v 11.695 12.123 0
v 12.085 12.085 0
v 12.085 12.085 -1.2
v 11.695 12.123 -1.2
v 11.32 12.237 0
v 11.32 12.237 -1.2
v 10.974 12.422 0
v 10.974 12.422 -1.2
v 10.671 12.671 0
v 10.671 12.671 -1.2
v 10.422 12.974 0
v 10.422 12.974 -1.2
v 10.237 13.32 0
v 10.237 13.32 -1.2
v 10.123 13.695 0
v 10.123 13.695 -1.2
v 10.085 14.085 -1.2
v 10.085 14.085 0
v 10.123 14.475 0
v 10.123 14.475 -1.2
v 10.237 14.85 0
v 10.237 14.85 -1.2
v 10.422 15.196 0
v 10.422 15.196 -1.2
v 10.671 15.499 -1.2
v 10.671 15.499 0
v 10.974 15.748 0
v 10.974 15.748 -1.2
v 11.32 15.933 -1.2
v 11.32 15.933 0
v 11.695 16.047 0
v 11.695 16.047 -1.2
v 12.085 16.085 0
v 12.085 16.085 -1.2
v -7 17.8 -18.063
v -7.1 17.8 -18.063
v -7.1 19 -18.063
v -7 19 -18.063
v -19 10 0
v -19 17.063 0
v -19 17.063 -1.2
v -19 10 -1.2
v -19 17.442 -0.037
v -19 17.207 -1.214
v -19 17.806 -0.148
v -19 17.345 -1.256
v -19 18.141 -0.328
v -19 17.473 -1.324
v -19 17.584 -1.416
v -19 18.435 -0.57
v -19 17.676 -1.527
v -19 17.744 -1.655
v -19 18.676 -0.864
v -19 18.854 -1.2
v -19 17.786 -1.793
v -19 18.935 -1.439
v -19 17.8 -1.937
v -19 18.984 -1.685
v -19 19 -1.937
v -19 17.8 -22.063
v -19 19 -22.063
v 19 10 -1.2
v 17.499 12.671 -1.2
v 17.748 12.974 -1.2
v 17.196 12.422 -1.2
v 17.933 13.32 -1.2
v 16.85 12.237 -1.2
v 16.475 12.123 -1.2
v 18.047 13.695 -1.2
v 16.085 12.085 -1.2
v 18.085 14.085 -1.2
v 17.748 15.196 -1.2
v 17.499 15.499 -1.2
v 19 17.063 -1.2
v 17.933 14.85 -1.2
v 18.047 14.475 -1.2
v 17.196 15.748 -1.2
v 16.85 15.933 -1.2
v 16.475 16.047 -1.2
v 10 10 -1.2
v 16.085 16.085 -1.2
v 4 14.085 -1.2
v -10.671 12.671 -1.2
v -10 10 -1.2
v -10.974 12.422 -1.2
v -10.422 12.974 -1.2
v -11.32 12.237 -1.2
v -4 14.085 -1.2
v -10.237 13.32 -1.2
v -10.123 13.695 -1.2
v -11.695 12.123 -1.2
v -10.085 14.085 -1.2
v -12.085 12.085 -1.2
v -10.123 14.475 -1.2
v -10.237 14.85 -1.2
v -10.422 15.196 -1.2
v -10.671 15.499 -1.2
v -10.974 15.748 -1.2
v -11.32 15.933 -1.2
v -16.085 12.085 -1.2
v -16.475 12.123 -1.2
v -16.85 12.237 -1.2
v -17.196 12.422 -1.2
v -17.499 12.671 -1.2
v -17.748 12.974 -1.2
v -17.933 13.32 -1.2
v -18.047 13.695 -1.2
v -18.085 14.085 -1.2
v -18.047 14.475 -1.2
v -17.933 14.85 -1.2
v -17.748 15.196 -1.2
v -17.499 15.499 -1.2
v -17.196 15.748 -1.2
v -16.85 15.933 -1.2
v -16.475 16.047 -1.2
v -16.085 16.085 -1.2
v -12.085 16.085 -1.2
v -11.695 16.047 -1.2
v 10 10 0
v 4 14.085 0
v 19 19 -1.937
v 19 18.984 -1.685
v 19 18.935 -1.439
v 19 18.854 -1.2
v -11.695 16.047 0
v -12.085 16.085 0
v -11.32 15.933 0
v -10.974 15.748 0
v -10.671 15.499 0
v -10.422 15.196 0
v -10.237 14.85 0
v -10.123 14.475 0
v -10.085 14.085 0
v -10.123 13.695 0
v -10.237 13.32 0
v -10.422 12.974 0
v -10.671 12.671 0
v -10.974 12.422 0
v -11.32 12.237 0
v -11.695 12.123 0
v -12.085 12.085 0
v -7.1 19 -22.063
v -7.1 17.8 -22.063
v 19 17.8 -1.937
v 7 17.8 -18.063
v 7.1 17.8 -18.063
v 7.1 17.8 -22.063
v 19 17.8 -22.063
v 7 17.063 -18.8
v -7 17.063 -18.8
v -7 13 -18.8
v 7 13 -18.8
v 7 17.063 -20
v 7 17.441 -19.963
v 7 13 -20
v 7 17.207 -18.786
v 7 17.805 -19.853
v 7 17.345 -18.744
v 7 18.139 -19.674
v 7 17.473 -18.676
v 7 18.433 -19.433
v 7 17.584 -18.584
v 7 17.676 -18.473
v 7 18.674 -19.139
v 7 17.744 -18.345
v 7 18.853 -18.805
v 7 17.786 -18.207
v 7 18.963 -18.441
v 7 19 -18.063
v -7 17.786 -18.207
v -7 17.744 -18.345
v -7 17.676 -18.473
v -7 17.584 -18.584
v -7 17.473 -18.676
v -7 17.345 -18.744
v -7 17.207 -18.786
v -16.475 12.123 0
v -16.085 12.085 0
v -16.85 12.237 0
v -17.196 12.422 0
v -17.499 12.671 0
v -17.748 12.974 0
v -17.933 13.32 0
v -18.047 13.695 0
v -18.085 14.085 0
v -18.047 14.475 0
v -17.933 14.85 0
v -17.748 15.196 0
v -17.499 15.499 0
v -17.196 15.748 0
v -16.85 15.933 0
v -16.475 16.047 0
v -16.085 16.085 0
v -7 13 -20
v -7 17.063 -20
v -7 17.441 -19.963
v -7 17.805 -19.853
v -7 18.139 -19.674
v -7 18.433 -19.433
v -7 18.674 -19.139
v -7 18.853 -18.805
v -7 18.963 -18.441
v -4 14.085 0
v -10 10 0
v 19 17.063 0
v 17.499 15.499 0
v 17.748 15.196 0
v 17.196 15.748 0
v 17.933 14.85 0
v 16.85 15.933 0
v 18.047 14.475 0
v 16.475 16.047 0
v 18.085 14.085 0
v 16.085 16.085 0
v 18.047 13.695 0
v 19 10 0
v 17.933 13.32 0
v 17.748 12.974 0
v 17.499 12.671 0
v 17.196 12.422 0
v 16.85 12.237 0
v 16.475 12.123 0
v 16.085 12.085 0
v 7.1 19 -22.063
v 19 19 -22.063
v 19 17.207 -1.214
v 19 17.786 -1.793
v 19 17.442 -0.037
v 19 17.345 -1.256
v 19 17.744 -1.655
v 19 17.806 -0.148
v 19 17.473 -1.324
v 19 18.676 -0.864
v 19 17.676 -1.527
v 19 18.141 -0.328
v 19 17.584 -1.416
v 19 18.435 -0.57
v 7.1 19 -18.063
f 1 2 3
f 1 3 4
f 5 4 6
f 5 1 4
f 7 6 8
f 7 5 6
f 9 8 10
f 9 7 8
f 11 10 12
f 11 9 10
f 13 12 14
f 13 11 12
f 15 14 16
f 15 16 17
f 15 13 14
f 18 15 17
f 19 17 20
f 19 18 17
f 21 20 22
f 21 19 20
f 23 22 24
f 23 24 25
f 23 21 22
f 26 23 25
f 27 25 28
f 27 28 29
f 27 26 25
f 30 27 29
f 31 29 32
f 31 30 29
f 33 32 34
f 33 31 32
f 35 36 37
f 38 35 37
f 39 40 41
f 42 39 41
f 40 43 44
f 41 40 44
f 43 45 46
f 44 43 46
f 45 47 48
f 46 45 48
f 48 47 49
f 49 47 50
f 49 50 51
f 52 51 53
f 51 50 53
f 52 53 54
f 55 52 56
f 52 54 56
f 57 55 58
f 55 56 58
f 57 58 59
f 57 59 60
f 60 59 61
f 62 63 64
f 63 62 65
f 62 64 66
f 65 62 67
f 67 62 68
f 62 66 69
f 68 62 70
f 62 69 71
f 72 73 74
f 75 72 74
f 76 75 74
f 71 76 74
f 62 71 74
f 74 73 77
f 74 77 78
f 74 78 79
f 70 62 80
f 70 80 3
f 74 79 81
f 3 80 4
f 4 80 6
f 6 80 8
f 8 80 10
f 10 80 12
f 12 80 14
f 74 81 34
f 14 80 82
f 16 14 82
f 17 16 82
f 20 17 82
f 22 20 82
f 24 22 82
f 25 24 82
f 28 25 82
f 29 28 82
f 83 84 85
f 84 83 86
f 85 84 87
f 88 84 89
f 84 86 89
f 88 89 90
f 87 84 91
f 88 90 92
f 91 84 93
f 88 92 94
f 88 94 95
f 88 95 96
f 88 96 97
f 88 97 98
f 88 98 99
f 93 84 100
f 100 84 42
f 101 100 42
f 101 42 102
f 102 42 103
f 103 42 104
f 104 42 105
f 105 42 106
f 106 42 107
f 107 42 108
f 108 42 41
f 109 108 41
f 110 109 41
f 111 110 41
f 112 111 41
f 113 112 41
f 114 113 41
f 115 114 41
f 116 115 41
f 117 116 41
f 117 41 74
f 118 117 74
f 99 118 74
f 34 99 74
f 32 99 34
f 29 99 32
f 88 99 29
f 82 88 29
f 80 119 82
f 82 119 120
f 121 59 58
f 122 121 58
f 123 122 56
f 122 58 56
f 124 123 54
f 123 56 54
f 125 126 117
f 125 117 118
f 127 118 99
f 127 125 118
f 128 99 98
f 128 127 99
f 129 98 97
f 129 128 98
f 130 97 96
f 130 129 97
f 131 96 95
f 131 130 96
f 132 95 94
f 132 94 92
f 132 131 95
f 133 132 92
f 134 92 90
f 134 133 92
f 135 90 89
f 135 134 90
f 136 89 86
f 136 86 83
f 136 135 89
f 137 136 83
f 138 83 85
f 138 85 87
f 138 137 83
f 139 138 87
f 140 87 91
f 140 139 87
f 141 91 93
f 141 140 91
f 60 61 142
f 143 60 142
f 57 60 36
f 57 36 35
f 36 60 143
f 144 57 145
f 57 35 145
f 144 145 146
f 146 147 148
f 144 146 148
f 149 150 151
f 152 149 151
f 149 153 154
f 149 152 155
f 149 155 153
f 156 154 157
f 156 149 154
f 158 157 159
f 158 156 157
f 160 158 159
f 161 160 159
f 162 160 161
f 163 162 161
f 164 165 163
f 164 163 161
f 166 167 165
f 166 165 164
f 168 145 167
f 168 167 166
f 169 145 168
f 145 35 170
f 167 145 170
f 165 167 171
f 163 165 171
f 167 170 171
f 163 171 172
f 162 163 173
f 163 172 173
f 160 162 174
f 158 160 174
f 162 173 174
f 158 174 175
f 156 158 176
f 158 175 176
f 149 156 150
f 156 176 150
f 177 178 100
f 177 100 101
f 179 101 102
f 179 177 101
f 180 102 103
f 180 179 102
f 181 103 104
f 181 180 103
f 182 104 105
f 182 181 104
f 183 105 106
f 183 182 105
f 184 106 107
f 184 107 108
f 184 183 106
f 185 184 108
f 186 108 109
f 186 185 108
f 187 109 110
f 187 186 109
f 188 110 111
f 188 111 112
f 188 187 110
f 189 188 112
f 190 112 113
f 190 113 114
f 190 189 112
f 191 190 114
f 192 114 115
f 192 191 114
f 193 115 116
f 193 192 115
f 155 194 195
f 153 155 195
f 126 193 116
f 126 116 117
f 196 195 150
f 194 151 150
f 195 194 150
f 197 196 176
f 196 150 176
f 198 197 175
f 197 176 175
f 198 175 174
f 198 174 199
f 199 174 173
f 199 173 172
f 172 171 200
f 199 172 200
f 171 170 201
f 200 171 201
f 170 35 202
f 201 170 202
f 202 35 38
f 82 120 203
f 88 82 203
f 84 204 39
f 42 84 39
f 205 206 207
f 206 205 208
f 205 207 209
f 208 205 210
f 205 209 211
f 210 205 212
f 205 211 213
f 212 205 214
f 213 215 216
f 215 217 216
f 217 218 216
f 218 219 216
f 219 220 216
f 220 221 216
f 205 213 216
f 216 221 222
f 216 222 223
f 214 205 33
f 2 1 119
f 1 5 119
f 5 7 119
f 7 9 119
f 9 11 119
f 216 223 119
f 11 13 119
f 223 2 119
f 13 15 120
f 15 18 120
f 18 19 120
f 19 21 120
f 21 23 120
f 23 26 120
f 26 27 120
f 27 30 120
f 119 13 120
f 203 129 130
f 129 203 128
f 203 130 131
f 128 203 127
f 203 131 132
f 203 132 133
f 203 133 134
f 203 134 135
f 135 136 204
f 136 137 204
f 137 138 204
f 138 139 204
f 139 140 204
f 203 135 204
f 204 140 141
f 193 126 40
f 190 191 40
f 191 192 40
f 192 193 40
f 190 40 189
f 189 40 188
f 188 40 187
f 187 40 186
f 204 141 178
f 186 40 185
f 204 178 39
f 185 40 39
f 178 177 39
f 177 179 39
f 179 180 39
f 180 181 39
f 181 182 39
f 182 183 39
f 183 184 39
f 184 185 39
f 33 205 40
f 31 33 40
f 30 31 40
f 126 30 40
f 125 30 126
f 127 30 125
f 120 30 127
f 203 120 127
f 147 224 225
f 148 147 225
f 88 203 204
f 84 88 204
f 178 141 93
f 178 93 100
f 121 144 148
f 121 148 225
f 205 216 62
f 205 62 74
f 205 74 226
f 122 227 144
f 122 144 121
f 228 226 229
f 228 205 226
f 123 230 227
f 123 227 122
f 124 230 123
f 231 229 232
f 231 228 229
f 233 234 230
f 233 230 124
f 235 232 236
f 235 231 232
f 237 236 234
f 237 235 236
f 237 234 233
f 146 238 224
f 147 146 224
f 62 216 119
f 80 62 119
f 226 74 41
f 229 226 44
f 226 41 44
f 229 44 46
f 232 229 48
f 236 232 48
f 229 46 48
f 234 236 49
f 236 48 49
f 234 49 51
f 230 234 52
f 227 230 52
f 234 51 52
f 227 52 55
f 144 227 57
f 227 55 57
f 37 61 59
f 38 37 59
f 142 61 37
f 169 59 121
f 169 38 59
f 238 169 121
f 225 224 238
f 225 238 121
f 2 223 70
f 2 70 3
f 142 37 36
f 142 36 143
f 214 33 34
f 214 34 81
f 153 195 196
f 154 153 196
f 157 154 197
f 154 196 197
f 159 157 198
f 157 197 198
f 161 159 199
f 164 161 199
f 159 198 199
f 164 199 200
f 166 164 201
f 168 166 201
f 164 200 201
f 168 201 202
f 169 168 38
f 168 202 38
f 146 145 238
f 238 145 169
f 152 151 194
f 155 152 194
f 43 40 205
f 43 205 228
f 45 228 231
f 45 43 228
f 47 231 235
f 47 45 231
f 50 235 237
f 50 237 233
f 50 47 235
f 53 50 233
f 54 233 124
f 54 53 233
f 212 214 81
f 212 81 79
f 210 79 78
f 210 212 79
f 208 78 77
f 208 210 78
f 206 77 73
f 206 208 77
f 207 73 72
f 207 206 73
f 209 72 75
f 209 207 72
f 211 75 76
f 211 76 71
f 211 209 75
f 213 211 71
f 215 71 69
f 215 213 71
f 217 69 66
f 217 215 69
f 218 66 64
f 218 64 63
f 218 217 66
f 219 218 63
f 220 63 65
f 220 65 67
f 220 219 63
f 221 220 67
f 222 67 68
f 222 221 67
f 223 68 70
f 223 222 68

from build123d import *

# Parameters (mm, degrees)
BRIDA_BASE1_DEPTH                = 1.2
BRIDA_DE_ARISTA1_STRIP_W         = 6.2732
BRIDA_DE_ARISTA1_STRIP_H         = 1.2
BRIDA_DE_ARISTA1_STRIP_CUT_DEPTH = 38
BRIDA_DE_ARISTA1_DEPTH           = 38
BRIDA_DE_ARISTA2_STRIP_W         = 6.2732
BRIDA_DE_ARISTA2_STRIP_H         = 1.2
BRIDA_DE_ARISTA2_STRIP_CUT_DEPTH = 38
BRIDA_DE_ARISTA2_DEPTH           = 38
DESDOBLAR1_START                 = -19
DESDOBLAR1_DEPTH                 = 38
DESDOBLAR1_2_DEPTH               = 38
CROQUIS14_W                      = 12
CROQUIS14_H                      = 6.162926371
CORTAR_EXTRUIR1_DEPTH            = 1.2
DOBLAR1_START                    = -19
DOBLAR1_DEPTH                    = 38
DOBLAR1_2_DEPTH                  = 38
DOBLAR1_START_2                  = -7
DOBLAR1_3_DEPTH                  = 14
CROQUIS16_W                      = 11.9
CROQUIS16_H                      = 4
SALIENTE_EXTRUIR1_DEPTH          = 1.2


# Read off the part's stored shape, not the designer's step: Desdoblar1, Doblar1
# Sheet-metal steps are written as plain solids
with BuildPart() as part:
    # Croquis1 → Brida base1 (new body)
    with BuildSketch(Plane.XY):
        Polygon((-19, 19), (19, 19), (19, 10), (10, 10), (4, 14.085), (-4, 14.085), (-10, 10), (-19, 10), align=None)
        with BuildLine():
            Line((-16.085, 16.085), (-12.085, 16.085))
            ThreePointArc((-12.085, 16.085), (-10.085, 14.085), (-12.085, 12.085))
            Line((-12.085, 12.085), (-16.085, 12.085))
            ThreePointArc((-16.085, 12.085), (-18.085, 14.085), (-16.085, 16.085))
        make_face(mode=Mode.SUBTRACT)
        with BuildLine():
            Line((12.085, 16.085), (16.085, 16.085))
            ThreePointArc((16.085, 16.085), (18.085, 14.085), (16.085, 12.085))
            Line((16.085, 12.085), (12.085, 12.085))
            ThreePointArc((12.085, 12.085), (10.085, 14.085), (12.085, 16.085))
        make_face(mode=Mode.SUBTRACT)
    extrude(amount=-BRIDA_BASE1_DEPTH)

    # Brida de arista1 strip (across the edge) → Brida de arista1 strip cut (cut)
    with BuildSketch(Plane(origin=(-19, 19, -1.2), x_dir=(0, -1, 0), z_dir=(1, 0, 0))):
        with Locations((-1.2, -0.6)):
            Rectangle(BRIDA_DE_ARISTA1_STRIP_W, BRIDA_DE_ARISTA1_STRIP_H)
    extrude(amount=BRIDA_DE_ARISTA1_STRIP_CUT_DEPTH, mode=Mode.SUBTRACT)

    # Brida de arista1 section (across the edge) → Brida de arista1 (add)
    with BuildSketch(Plane(origin=(-19, 19, -1.2), x_dir=(0, -1, 0), z_dir=(1, 0, 0))):
        with BuildLine():
            Line((0, 0.7366), (0, 18.8))
            Line((0, 18.8), (1.2, 18.8))
            Line((1.2, 18.8), (1.2, 0.7366))
            ThreePointArc((1.2, 0.7366), (1.415745145, 0.215745145), (1.9366, 0))
            Line((1.9366, 0), (1.9366, -1.2))
            ThreePointArc((1.9366, -1.2), (0.567217008, -0.632782992), (0, 0.7366))
        make_face()
    extrude(amount=BRIDA_DE_ARISTA1_DEPTH)

    # Brida de arista2 strip (across the edge) → Brida de arista2 strip cut (cut)
    with BuildSketch(Plane(origin=(-19, 17.8, -20), x_dir=(0, 0, 1), z_dir=(1, 0, 0))):
        with Locations((-1.2, -0.6)):
            Rectangle(BRIDA_DE_ARISTA2_STRIP_W, BRIDA_DE_ARISTA2_STRIP_H)
    extrude(amount=BRIDA_DE_ARISTA2_STRIP_CUT_DEPTH, mode=Mode.SUBTRACT)

    # Brida de arista2 section (across the edge) → Brida de arista2 (add)
    with BuildSketch(Plane(origin=(-19, 17.8, -20), x_dir=(0, 0, 1), z_dir=(1, 0, 0))):
        with BuildLine():
            Line((0, 0.7366), (0, 4.8))
            Line((0, 4.8), (1.2, 4.8))
            Line((1.2, 4.8), (1.2, 0.7366))
            ThreePointArc((1.2, 0.7366), (1.415745145, 0.215745145), (1.9366, 0))
            Line((1.9366, 0), (1.9366, -1.2))
            ThreePointArc((1.9366, -1.2), (0.567217008, -0.632782992), (0, 0.7366))
        make_face()
    extrude(amount=BRIDA_DE_ARISTA2_DEPTH)

    # Desdoblar1 outline → Desdoblar1 (cut)
    with BuildSketch(Plane.YZ.offset(DESDOBLAR1_START)):
        with BuildLine():
            ThreePointArc((19, -1.9366), (18.963262642, -1.561178238), (18.854444388, -1.2))
            Line((18.854444388, -1.2), (17.0634, -1.2))
            ThreePointArc((17.0634, -1.2), (17.584254855, -1.415745145), (17.8, -1.9366))
            Line((17.8, -1.9366), (17.8, -18.0634))
            ThreePointArc((17.8, -18.0634), (17.584254855, -18.584254855), (17.0634, -18.8))
            Line((17.0634, -18.8), (13, -18.8))
            Line((13, -18.8), (13, -20))
            Line((13, -20), (17.0634, -20))
            ThreePointArc((17.0634, -20), (18.432782992, -19.432782992), (19, -18.0634))
            Line((19, -18.0634), (19, -1.9366))
        make_face()
    extrude(amount=DESDOBLAR1_DEPTH, mode=Mode.SUBTRACT)

    # Desdoblar1 2 outline → Desdoblar1 2 (add)
    with BuildSketch(Plane.YZ.offset(DESDOBLAR1_START)):
        with BuildLine():
            Line((41.452652741, 0), (17.0634, 0))
            ThreePointArc((17.0634, 0), (18.141342484, -0.327730969), (18.854444388, -1.2))
            Line((18.854444388, -1.2), (41.452652741, -1.2))
            Line((41.452652741, -1.2), (41.452652741, 0))
        make_face()
    extrude(amount=DESDOBLAR1_2_DEPTH)

    # Croquis14 → Cortar-Extruir1 (cut)
    with BuildSketch(Plane(origin=(0, 0, -1.2), x_dir=(-1, 0, 0), z_dir=(0, 0, -1))):
        with Locations((13, 38.371189556)):
            Rectangle(CROQUIS14_W, CROQUIS14_H)
        with Locations((-13, 38.371189556)):
            Rectangle(CROQUIS14_W, CROQUIS14_H)
    extrude(amount=-CORTAR_EXTRUIR1_DEPTH, mode=Mode.SUBTRACT)

    # Doblar1 outline → Doblar1 (cut)
    with BuildSketch(Plane.YZ.offset(DOBLAR1_START)):
        with BuildLine():
            ThreePointArc((17.0634, 0), (18.141342484, -0.327730969), (18.854444388, -1.2))
            Line((18.854444388, -1.2), (41.452652741, -1.2))
            Line((41.452652741, -1.2), (41.452652741, 0))
            Line((41.452652741, 0), (17.0634, 0))
        make_face()
    extrude(amount=DOBLAR1_DEPTH, mode=Mode.SUBTRACT)

    # Doblar1 2 outline → Doblar1 2 (add)
    with BuildSketch(Plane.YZ.offset(DOBLAR1_START)):
        with BuildLine():
            Line((19, -18.0634), (19, -1.9366))
            ThreePointArc((19, -1.9366), (18.963262642, -1.561178238), (18.854444388, -1.2))
            Line((18.854444388, -1.2), (17.0634, -1.2))
            ThreePointArc((17.0634, -1.2), (17.584254855, -1.415745145), (17.8, -1.9366))
            Line((17.8, -1.9366), (17.8, -18.0634))
            Line((17.8, -18.0634), (19, -18.0634))
        make_face()
    extrude(amount=DOBLAR1_2_DEPTH)

    # Doblar1 3 outline → Doblar1 3 (add)
    with BuildSketch(Plane.YZ.offset(DOBLAR1_START_2)):
        with BuildLine():
            ThreePointArc((17.0634, -20), (18.432782992, -19.432782992), (19, -18.0634))
            Line((19, -18.0634), (17.8, -18.0634))
            ThreePointArc((17.8, -18.0634), (17.584254855, -18.584254855), (17.0634, -18.8))
            Line((17.0634, -18.8), (13, -18.8))
            Line((13, -18.8), (13, -20))
            Line((13, -20), (17.0634, -20))
        make_face()
    extrude(amount=DOBLAR1_3_DEPTH)

    # Croquis16 → Saliente-Extruir1 (add)
    with BuildSketch(Plane(origin=(0, 19, 0), x_dir=(1, 0, 0), z_dir=(0, 1, 0))):
        with Locations((-13.05, 20.0634)):
            Rectangle(CROQUIS16_W, CROQUIS16_H)
        with Locations((13.05, 20.0634)):
            Rectangle(CROQUIS16_W, CROQUIS16_H)
    extrude(amount=-SALIENTE_EXTRUIR1_DEPTH)


solid = part.part
